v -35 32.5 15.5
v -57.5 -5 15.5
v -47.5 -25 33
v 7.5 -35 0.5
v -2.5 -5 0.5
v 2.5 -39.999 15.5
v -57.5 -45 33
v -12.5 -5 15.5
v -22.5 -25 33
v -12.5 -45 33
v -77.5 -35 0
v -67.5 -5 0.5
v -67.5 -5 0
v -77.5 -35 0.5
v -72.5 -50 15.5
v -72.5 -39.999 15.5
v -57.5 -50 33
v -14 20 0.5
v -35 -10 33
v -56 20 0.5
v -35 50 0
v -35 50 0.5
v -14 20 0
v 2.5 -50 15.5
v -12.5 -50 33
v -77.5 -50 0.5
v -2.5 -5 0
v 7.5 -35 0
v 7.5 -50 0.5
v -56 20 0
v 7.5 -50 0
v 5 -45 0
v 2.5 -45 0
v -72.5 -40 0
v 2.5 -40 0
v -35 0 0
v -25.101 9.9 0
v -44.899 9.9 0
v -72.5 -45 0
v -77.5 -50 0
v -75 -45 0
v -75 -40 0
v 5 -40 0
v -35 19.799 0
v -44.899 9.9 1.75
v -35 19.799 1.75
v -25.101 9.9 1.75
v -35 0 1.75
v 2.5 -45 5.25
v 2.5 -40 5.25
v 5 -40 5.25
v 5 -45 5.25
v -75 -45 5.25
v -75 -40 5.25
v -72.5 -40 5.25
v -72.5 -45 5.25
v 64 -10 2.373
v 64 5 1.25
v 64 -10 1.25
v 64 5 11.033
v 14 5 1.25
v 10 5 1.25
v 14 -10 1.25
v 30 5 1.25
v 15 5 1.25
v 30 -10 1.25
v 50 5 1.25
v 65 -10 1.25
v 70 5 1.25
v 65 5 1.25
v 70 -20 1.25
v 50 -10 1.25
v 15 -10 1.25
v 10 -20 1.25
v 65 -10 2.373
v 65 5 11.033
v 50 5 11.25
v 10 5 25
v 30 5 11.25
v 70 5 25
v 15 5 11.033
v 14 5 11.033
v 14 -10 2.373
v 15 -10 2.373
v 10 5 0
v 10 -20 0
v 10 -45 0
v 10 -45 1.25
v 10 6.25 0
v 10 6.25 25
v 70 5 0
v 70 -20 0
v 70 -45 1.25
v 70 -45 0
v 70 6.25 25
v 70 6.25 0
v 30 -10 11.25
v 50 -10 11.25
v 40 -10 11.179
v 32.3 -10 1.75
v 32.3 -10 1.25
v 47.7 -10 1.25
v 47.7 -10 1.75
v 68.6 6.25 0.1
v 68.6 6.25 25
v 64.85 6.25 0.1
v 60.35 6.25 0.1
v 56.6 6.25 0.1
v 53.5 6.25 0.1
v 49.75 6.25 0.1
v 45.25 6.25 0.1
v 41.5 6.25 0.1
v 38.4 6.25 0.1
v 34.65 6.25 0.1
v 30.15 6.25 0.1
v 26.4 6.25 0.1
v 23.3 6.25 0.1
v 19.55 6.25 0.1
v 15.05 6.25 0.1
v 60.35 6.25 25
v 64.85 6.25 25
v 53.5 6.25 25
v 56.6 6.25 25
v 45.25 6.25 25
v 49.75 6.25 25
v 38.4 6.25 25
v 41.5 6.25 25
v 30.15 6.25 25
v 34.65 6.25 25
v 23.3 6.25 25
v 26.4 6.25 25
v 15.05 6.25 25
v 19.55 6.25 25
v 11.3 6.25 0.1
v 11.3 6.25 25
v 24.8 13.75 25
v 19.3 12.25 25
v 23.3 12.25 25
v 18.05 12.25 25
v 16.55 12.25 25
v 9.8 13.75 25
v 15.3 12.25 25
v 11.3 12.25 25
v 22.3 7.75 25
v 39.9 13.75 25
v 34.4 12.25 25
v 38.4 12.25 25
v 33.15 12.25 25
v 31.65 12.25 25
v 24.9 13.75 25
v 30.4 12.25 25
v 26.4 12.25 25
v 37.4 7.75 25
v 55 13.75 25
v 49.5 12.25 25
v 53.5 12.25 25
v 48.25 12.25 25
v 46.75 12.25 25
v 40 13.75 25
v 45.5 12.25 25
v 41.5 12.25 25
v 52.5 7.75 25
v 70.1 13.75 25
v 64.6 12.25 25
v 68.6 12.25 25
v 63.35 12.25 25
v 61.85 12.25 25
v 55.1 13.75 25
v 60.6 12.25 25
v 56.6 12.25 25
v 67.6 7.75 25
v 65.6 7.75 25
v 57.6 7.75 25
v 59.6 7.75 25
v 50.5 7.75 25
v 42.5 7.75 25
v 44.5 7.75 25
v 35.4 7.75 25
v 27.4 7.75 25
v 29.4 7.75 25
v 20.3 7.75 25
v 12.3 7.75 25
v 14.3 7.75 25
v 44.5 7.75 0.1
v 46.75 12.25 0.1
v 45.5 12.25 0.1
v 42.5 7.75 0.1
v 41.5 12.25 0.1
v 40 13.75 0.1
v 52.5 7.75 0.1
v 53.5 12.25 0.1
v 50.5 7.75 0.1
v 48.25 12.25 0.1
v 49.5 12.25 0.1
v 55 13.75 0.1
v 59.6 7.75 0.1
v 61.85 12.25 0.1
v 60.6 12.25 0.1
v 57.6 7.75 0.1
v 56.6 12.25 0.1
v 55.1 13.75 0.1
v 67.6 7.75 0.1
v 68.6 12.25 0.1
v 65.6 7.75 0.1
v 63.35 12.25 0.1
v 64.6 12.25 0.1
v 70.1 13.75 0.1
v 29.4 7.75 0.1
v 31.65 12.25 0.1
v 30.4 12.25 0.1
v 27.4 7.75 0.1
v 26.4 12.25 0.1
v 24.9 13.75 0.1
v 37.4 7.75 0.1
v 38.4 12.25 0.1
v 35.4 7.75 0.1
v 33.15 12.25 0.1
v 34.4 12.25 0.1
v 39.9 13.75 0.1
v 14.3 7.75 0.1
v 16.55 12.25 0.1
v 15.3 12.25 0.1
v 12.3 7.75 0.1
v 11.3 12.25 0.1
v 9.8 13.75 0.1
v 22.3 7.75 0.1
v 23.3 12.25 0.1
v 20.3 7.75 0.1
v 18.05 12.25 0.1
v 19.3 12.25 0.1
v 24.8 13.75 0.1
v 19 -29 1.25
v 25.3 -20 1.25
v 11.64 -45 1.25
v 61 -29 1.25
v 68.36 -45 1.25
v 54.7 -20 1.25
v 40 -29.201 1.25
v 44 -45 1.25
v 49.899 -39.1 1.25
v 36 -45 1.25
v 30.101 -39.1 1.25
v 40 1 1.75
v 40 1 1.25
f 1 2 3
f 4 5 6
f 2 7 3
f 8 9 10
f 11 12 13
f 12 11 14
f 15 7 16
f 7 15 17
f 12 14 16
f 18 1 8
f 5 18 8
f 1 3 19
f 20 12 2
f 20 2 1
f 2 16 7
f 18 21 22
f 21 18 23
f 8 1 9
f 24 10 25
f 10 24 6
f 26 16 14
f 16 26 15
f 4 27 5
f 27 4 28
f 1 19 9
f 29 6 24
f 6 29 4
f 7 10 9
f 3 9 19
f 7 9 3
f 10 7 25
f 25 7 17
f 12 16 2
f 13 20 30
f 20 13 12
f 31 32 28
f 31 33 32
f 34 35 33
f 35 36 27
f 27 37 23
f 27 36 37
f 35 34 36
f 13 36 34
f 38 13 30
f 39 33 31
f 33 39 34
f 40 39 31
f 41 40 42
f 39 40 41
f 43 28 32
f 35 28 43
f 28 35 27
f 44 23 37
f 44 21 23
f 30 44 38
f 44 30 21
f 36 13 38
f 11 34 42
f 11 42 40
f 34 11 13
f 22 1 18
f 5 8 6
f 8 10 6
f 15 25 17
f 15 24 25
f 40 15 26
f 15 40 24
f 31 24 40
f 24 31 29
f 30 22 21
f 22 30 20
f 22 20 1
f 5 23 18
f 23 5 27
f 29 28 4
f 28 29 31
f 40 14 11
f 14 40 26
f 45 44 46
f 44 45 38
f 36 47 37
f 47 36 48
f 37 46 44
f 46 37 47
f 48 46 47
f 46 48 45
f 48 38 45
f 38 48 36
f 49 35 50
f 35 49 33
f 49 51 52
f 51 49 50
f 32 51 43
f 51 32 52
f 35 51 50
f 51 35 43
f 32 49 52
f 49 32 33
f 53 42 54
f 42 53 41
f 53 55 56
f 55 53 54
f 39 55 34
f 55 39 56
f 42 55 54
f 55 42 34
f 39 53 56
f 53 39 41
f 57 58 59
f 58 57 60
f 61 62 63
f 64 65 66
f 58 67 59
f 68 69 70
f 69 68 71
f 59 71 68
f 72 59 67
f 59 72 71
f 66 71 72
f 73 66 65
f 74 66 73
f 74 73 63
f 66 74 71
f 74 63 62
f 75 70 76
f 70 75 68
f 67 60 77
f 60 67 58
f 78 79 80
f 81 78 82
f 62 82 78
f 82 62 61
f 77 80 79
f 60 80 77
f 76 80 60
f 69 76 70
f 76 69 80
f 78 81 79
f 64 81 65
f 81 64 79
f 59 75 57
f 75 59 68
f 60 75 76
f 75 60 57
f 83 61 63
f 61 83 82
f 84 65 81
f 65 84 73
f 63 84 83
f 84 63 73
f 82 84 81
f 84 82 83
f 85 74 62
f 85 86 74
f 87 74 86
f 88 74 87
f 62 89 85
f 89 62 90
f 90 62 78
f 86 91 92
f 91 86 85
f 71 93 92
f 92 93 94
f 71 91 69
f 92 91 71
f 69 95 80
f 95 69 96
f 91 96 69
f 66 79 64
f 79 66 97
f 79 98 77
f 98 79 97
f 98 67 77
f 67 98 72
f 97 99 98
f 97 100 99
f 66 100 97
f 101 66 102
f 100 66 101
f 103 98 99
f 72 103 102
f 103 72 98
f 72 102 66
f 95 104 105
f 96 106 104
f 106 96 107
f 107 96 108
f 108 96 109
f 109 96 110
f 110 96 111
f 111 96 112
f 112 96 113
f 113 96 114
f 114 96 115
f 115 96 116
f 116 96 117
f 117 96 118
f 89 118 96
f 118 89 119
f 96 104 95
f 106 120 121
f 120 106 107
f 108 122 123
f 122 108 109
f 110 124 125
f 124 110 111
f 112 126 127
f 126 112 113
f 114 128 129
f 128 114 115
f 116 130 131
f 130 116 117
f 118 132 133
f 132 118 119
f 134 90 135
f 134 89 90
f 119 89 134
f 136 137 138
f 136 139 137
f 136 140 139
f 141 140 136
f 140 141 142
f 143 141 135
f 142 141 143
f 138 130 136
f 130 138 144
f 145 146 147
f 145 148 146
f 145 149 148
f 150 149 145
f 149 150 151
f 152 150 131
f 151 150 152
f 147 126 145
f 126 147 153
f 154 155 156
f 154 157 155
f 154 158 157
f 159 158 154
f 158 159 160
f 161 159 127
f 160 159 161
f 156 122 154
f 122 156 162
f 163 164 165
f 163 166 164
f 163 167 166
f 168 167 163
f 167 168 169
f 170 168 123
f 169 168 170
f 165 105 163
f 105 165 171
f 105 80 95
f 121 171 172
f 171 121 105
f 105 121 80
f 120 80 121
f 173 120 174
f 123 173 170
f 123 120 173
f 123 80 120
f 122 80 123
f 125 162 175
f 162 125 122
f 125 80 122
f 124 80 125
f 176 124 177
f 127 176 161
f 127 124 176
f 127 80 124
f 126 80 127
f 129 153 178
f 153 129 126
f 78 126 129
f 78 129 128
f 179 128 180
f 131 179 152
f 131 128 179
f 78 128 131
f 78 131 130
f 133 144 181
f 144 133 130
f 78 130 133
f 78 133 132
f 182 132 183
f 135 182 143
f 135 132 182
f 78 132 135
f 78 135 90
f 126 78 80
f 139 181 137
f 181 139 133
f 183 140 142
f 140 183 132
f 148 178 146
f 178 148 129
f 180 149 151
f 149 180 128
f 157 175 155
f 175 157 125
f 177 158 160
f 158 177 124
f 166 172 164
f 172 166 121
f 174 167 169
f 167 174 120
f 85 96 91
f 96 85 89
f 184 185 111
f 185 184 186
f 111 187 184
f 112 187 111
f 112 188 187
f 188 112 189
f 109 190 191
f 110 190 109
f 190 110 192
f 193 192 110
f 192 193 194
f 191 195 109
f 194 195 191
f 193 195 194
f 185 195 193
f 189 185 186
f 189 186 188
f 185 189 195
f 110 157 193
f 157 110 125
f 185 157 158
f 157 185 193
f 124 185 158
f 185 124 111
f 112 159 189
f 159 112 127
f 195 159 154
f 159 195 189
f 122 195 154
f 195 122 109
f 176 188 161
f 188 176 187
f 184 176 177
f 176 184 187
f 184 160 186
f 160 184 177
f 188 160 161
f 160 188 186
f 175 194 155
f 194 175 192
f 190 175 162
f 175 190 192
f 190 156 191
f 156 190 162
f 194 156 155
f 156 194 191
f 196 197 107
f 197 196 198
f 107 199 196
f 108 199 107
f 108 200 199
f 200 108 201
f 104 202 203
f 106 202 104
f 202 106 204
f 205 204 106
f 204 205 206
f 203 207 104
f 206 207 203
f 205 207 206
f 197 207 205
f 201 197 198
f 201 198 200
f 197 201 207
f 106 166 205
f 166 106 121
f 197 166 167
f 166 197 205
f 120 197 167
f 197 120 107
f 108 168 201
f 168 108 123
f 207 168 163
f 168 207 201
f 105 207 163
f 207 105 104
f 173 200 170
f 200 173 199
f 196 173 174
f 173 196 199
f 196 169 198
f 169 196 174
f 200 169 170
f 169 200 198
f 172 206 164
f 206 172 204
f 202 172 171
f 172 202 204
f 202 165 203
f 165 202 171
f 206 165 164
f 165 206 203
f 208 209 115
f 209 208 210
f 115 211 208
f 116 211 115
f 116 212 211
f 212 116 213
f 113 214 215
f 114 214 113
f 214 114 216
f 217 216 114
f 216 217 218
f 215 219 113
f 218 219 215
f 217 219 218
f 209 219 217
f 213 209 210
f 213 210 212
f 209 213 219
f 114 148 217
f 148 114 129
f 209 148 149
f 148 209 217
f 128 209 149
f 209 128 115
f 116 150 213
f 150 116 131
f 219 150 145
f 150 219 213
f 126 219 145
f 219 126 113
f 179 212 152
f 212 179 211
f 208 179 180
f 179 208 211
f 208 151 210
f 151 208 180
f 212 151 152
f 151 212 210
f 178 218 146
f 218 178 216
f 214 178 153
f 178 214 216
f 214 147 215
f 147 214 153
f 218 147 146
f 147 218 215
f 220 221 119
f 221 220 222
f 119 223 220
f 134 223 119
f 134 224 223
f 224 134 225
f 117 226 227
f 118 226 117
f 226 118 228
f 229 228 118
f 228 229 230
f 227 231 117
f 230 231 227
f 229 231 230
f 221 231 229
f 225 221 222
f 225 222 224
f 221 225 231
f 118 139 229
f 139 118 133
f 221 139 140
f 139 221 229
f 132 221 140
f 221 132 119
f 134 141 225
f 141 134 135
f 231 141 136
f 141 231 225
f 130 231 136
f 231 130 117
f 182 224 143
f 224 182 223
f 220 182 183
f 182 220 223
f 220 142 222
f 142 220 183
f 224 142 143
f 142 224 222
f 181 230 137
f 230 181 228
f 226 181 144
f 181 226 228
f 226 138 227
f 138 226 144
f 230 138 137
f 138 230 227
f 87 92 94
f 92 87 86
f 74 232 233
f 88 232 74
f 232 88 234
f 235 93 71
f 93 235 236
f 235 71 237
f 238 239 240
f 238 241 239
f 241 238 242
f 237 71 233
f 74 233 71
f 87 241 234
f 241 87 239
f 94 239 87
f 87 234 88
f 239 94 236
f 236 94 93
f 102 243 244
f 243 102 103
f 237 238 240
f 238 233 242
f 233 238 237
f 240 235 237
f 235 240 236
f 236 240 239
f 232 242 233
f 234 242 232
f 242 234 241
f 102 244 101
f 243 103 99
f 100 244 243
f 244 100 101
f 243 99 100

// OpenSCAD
// Size of storage hatch
//cube([1.2,1.2,.6]);

// Scale is meters

module bumper() {
//rotate([0,0,360*$t])
difference() {
translate([-.6,-.6,0]) cube([1.2,1.2,.6]);

translate([1.0,0,0])
scale([1.7,1,1])
rotate([0,0,45]) translate([-.6,-.6,-0.001]) cube([1.2,1.2,.3]);

translate([0,-.61,-.001]) cube([1.22,1.22,.3]);
}
}

// rough hull model
module rough_hull() {
    
    difference() 
    {
        
    color([.7,.7,.7])
    hull() 
    {
    // Top deck

    translate([0,0,0.65]) 
    linear_extrude(height = 0.01, center = true, convexity = 10, twist = 0)
//    scale([1,1,0.001])
    polygon(points=[[0,0],[-.42,-.6],[-.65,-1.1],[-.85,-1.7],[-.85,-2.0],[.85,-2.0],[.85,-1.7],[.42,-.6],[.65,-1.1]]);

    // Halfway down
    translate([0,0,0.35]) 
    linear_extrude(height = 0.01, center = true, convexity = 10, twist = 0)
//    scale([1,1,0.001])
    polygon(points=[[0,-.35],[-.45,-1.1],[-.75,-1.8],[-.75,-2.0],[.75,-2.0],[.75,-1.8],[.45,-1.1]]);
    
    // Bottom
    translate([0,0,0.0]) 
    linear_extrude(height = 0.01, center = true, convexity = 10, twist = 0)
//    scale([1,1,0.001])
    polygon(points=[[0,-1.2],[-.25,-1.5],[-.45,-1.9],[-.45,-2.0],[.45,-2.0],[.45,-1.9],[.25,-1.5]]);
    }
    
    // Cutout for hatch
    translate([0,-1,0.62]) rotate([0,0,45]) cube([.28,.28,.5]);

    // tie-downs
    translate([-0.8,-1.9,0.55]) cube([.05,.1,.3]);
    translate([0.75,-1.9,0.55]) cube([.05,.1,.3]);

}
   
    
 
}


module w_bumper() {
color([.35,.35,.35])
scale(0.001)
    linear_extrude(height = 600, center = false, convexity = 10, twist = 0)

polygon(points=[[0,0],[30,150],[105,150],[135,30],[165,30],[195,150],[270,150],[300,0], 
[30,30],[50,120],[90,120],[110,30],
[190,30],[210,120],[250,120],[270,30]

],

paths=[[0,1,2,3,4,5,6,7],[8,9,10,11],[12,13,14,15]]
);
}

module plate_rear() {
        color([0.8,0.8,0.8])

    translate([-.6,-.25,0]) cube([1.2,.5,0.025]);
}

module plate_front() {
    color([0.8,0.8,0.8])
    {
    translate([-.6,-.25,0]) cube([1.2,.5,0.025]);
    
        // bracket
        difference() {
    translate([-.5,-.05,-.2])
        cube([0.02,0.3,0.2]);
            
    translate([-.51,-.30,-.34])
    rotate([-30,0,0])
        cube([0.04,0.5,0.4]);

        }

        // bracket
        difference() {
    translate([.5,-.05,-.2])
        cube([0.02,0.3,0.2]);
            
    translate([.49,-.30,-.34])
    rotate([-30,0,0])
        cube([0.04,0.5,0.4]);

        }
        
    }
    
    color("blue")
    translate([-.2,-.05,-.2])    cube([.4,.3,.2]);
}

module bumper_plate() {
    color([0.8,0.8,0.8])


    translate([-.6,.025,0]) 
    rotate([90,0,0])
    cube([1.2,.5,0.025]);
    
    
    color("grey")
        //translate([0,.25+.025,.18])   
    translate([0,.15+.025,0])   
    scale([1,1,0.83])
    rotate([0,0,180])
    w_bumper();

    color("grey")
        //translate([0,.25+.025,.18])   
    translate([-0.302,.15+.025,0])   
    scale([1,1,0.83])
    rotate([0,0,180])
    w_bumper();

    color("grey")
        //translate([0,.25+.025,.18])   
    translate([0.302,.15+.025,0])   
    scale([1,1,0.83])
    rotate([0,0,180])
    w_bumper();

    color("grey")
        //translate([0,.25+.025,.18])   
    translate([0.604,.15+.025,0])   
    scale([1,1,0.83])
    rotate([0,0,180])
    w_bumper();

}

module straps() {
    color("red")
    {
    translate([0.76,-1.85,.66])
    rotate([0,0,12])
    cube([.03,1.3,.001]);

    translate([-0.79,-1.85,.66])
    rotate([0,0,-12])
    cube([.03,1.3,.001]);
    }
}


module bumper_final_position() {
    deck_height = 0.65;
    translate([0,-.65,deck_height]) plate_rear();
    translate([0,-0.15,deck_height]) plate_front();
    translate([0, .10,deck_height - .5+.025]) bumper_plate();
 //   straps();
}


module bumper_for_printing() {
    deck_height = 0.65;
    
    translate([0,-.65,deck_height-.02]) plate_rear();
    translate([0,-0.15,deck_height-.02]) plate_front();
    translate([0, .10,deck_height - .5+.0]) bumper_plate();
    //straps();
}


module bumper_animate() {
    deck_height = 0.65;
    
    //$t = .4;
    
    if ( $t < 0.1 ) {
        // drop rear plate
        translate([0,0,3*(.1-$t)])
        translate([0,-.65,deck_height]) plate_rear();
    } else if ( $t < 0.2 ) {
        // drop front plate
        translate([0,0,0.25+5*(.2-$t)])
        translate([0,-0.38,deck_height])  rotate([90,0,0]) plate_front();

        translate([0,-.65,deck_height]) plate_rear();
    } else if ( $t < 0.3 ) {
        // rotate front plate
        translate([0,-0.38,deck_height])  
        rotate([90*(.3-$t)/0.1,0,0]) 
        translate([0,.25,0])
        plate_front();

        translate([0,-.65,deck_height]) plate_rear();
    } else if ( $t < 0.4 ) {
        // straps
        translate([0,-10*(.4-$t),0]) scale([1,1-10*(.4-$t),1]) straps();
        
        translate([0,-0.15,deck_height]) plate_front();
        translate([0,-.65,deck_height]) plate_rear();

    } else if ( $t < 0.5 ) {
        // bumper plate
        translate([0,0,10*(.5-$t)])
        translate([0, .10,deck_height - .5+.025]) 
        bumper_plate();

        straps();
        translate([0,-0.15,deck_height]) plate_front();
        translate([0,-.65,deck_height]) plate_rear();
        
    } else if ( $t < 0.6 ) {
        translate([0, .10,deck_height - .5+.025]) bumper_plate();
        straps();
        translate([0,-0.15,deck_height]) plate_front();
        translate([0,-.65,deck_height]) plate_rear();
    } else  {

        translate([0, .10,deck_height - .5+.025]) bumper_plate();
        straps();
        translate([0,-0.15,deck_height]) plate_front();
        translate([0,-.65,deck_height]) plate_rear();
    }
    

}

module storage() {
   translate([0,-.70,.220]) rotate([-90,0,0]) bumper_plate();
   translate([0,.10,.20]) rotate([00,0,0])   plate_front();
   translate([0,-.450,0])    plate_rear(); 
    
}

module print_layout() {

scale(5) 
    {
        /*
translate([-1.5,0,0]) {
    translate([0,.450,0]) bumper_plate();
   translate([0,.10,.025]) rotate([180,0,180]) plate_front();
   translate([0,-.450,0])    plate_rear(); 
}
        */
    
   translate([-0.7,1,.655]) rotate([0,180,0]) rough_hull();


    translate([.8,0,0.65+0.025]) 
    rotate([0,180,0])
    difference() {
    bumper_final_position();
    translate([0,0.02,-.005]) rough_hull();
    }

}
}


scale(10)
{
    
   print_layout(); 

//    bumper_animate();
  //  bumper_for_printing();
    
    
//    bumper_plate();
//    translate([0,-1.2,.6]) plate();
    //bumper();
    
}
